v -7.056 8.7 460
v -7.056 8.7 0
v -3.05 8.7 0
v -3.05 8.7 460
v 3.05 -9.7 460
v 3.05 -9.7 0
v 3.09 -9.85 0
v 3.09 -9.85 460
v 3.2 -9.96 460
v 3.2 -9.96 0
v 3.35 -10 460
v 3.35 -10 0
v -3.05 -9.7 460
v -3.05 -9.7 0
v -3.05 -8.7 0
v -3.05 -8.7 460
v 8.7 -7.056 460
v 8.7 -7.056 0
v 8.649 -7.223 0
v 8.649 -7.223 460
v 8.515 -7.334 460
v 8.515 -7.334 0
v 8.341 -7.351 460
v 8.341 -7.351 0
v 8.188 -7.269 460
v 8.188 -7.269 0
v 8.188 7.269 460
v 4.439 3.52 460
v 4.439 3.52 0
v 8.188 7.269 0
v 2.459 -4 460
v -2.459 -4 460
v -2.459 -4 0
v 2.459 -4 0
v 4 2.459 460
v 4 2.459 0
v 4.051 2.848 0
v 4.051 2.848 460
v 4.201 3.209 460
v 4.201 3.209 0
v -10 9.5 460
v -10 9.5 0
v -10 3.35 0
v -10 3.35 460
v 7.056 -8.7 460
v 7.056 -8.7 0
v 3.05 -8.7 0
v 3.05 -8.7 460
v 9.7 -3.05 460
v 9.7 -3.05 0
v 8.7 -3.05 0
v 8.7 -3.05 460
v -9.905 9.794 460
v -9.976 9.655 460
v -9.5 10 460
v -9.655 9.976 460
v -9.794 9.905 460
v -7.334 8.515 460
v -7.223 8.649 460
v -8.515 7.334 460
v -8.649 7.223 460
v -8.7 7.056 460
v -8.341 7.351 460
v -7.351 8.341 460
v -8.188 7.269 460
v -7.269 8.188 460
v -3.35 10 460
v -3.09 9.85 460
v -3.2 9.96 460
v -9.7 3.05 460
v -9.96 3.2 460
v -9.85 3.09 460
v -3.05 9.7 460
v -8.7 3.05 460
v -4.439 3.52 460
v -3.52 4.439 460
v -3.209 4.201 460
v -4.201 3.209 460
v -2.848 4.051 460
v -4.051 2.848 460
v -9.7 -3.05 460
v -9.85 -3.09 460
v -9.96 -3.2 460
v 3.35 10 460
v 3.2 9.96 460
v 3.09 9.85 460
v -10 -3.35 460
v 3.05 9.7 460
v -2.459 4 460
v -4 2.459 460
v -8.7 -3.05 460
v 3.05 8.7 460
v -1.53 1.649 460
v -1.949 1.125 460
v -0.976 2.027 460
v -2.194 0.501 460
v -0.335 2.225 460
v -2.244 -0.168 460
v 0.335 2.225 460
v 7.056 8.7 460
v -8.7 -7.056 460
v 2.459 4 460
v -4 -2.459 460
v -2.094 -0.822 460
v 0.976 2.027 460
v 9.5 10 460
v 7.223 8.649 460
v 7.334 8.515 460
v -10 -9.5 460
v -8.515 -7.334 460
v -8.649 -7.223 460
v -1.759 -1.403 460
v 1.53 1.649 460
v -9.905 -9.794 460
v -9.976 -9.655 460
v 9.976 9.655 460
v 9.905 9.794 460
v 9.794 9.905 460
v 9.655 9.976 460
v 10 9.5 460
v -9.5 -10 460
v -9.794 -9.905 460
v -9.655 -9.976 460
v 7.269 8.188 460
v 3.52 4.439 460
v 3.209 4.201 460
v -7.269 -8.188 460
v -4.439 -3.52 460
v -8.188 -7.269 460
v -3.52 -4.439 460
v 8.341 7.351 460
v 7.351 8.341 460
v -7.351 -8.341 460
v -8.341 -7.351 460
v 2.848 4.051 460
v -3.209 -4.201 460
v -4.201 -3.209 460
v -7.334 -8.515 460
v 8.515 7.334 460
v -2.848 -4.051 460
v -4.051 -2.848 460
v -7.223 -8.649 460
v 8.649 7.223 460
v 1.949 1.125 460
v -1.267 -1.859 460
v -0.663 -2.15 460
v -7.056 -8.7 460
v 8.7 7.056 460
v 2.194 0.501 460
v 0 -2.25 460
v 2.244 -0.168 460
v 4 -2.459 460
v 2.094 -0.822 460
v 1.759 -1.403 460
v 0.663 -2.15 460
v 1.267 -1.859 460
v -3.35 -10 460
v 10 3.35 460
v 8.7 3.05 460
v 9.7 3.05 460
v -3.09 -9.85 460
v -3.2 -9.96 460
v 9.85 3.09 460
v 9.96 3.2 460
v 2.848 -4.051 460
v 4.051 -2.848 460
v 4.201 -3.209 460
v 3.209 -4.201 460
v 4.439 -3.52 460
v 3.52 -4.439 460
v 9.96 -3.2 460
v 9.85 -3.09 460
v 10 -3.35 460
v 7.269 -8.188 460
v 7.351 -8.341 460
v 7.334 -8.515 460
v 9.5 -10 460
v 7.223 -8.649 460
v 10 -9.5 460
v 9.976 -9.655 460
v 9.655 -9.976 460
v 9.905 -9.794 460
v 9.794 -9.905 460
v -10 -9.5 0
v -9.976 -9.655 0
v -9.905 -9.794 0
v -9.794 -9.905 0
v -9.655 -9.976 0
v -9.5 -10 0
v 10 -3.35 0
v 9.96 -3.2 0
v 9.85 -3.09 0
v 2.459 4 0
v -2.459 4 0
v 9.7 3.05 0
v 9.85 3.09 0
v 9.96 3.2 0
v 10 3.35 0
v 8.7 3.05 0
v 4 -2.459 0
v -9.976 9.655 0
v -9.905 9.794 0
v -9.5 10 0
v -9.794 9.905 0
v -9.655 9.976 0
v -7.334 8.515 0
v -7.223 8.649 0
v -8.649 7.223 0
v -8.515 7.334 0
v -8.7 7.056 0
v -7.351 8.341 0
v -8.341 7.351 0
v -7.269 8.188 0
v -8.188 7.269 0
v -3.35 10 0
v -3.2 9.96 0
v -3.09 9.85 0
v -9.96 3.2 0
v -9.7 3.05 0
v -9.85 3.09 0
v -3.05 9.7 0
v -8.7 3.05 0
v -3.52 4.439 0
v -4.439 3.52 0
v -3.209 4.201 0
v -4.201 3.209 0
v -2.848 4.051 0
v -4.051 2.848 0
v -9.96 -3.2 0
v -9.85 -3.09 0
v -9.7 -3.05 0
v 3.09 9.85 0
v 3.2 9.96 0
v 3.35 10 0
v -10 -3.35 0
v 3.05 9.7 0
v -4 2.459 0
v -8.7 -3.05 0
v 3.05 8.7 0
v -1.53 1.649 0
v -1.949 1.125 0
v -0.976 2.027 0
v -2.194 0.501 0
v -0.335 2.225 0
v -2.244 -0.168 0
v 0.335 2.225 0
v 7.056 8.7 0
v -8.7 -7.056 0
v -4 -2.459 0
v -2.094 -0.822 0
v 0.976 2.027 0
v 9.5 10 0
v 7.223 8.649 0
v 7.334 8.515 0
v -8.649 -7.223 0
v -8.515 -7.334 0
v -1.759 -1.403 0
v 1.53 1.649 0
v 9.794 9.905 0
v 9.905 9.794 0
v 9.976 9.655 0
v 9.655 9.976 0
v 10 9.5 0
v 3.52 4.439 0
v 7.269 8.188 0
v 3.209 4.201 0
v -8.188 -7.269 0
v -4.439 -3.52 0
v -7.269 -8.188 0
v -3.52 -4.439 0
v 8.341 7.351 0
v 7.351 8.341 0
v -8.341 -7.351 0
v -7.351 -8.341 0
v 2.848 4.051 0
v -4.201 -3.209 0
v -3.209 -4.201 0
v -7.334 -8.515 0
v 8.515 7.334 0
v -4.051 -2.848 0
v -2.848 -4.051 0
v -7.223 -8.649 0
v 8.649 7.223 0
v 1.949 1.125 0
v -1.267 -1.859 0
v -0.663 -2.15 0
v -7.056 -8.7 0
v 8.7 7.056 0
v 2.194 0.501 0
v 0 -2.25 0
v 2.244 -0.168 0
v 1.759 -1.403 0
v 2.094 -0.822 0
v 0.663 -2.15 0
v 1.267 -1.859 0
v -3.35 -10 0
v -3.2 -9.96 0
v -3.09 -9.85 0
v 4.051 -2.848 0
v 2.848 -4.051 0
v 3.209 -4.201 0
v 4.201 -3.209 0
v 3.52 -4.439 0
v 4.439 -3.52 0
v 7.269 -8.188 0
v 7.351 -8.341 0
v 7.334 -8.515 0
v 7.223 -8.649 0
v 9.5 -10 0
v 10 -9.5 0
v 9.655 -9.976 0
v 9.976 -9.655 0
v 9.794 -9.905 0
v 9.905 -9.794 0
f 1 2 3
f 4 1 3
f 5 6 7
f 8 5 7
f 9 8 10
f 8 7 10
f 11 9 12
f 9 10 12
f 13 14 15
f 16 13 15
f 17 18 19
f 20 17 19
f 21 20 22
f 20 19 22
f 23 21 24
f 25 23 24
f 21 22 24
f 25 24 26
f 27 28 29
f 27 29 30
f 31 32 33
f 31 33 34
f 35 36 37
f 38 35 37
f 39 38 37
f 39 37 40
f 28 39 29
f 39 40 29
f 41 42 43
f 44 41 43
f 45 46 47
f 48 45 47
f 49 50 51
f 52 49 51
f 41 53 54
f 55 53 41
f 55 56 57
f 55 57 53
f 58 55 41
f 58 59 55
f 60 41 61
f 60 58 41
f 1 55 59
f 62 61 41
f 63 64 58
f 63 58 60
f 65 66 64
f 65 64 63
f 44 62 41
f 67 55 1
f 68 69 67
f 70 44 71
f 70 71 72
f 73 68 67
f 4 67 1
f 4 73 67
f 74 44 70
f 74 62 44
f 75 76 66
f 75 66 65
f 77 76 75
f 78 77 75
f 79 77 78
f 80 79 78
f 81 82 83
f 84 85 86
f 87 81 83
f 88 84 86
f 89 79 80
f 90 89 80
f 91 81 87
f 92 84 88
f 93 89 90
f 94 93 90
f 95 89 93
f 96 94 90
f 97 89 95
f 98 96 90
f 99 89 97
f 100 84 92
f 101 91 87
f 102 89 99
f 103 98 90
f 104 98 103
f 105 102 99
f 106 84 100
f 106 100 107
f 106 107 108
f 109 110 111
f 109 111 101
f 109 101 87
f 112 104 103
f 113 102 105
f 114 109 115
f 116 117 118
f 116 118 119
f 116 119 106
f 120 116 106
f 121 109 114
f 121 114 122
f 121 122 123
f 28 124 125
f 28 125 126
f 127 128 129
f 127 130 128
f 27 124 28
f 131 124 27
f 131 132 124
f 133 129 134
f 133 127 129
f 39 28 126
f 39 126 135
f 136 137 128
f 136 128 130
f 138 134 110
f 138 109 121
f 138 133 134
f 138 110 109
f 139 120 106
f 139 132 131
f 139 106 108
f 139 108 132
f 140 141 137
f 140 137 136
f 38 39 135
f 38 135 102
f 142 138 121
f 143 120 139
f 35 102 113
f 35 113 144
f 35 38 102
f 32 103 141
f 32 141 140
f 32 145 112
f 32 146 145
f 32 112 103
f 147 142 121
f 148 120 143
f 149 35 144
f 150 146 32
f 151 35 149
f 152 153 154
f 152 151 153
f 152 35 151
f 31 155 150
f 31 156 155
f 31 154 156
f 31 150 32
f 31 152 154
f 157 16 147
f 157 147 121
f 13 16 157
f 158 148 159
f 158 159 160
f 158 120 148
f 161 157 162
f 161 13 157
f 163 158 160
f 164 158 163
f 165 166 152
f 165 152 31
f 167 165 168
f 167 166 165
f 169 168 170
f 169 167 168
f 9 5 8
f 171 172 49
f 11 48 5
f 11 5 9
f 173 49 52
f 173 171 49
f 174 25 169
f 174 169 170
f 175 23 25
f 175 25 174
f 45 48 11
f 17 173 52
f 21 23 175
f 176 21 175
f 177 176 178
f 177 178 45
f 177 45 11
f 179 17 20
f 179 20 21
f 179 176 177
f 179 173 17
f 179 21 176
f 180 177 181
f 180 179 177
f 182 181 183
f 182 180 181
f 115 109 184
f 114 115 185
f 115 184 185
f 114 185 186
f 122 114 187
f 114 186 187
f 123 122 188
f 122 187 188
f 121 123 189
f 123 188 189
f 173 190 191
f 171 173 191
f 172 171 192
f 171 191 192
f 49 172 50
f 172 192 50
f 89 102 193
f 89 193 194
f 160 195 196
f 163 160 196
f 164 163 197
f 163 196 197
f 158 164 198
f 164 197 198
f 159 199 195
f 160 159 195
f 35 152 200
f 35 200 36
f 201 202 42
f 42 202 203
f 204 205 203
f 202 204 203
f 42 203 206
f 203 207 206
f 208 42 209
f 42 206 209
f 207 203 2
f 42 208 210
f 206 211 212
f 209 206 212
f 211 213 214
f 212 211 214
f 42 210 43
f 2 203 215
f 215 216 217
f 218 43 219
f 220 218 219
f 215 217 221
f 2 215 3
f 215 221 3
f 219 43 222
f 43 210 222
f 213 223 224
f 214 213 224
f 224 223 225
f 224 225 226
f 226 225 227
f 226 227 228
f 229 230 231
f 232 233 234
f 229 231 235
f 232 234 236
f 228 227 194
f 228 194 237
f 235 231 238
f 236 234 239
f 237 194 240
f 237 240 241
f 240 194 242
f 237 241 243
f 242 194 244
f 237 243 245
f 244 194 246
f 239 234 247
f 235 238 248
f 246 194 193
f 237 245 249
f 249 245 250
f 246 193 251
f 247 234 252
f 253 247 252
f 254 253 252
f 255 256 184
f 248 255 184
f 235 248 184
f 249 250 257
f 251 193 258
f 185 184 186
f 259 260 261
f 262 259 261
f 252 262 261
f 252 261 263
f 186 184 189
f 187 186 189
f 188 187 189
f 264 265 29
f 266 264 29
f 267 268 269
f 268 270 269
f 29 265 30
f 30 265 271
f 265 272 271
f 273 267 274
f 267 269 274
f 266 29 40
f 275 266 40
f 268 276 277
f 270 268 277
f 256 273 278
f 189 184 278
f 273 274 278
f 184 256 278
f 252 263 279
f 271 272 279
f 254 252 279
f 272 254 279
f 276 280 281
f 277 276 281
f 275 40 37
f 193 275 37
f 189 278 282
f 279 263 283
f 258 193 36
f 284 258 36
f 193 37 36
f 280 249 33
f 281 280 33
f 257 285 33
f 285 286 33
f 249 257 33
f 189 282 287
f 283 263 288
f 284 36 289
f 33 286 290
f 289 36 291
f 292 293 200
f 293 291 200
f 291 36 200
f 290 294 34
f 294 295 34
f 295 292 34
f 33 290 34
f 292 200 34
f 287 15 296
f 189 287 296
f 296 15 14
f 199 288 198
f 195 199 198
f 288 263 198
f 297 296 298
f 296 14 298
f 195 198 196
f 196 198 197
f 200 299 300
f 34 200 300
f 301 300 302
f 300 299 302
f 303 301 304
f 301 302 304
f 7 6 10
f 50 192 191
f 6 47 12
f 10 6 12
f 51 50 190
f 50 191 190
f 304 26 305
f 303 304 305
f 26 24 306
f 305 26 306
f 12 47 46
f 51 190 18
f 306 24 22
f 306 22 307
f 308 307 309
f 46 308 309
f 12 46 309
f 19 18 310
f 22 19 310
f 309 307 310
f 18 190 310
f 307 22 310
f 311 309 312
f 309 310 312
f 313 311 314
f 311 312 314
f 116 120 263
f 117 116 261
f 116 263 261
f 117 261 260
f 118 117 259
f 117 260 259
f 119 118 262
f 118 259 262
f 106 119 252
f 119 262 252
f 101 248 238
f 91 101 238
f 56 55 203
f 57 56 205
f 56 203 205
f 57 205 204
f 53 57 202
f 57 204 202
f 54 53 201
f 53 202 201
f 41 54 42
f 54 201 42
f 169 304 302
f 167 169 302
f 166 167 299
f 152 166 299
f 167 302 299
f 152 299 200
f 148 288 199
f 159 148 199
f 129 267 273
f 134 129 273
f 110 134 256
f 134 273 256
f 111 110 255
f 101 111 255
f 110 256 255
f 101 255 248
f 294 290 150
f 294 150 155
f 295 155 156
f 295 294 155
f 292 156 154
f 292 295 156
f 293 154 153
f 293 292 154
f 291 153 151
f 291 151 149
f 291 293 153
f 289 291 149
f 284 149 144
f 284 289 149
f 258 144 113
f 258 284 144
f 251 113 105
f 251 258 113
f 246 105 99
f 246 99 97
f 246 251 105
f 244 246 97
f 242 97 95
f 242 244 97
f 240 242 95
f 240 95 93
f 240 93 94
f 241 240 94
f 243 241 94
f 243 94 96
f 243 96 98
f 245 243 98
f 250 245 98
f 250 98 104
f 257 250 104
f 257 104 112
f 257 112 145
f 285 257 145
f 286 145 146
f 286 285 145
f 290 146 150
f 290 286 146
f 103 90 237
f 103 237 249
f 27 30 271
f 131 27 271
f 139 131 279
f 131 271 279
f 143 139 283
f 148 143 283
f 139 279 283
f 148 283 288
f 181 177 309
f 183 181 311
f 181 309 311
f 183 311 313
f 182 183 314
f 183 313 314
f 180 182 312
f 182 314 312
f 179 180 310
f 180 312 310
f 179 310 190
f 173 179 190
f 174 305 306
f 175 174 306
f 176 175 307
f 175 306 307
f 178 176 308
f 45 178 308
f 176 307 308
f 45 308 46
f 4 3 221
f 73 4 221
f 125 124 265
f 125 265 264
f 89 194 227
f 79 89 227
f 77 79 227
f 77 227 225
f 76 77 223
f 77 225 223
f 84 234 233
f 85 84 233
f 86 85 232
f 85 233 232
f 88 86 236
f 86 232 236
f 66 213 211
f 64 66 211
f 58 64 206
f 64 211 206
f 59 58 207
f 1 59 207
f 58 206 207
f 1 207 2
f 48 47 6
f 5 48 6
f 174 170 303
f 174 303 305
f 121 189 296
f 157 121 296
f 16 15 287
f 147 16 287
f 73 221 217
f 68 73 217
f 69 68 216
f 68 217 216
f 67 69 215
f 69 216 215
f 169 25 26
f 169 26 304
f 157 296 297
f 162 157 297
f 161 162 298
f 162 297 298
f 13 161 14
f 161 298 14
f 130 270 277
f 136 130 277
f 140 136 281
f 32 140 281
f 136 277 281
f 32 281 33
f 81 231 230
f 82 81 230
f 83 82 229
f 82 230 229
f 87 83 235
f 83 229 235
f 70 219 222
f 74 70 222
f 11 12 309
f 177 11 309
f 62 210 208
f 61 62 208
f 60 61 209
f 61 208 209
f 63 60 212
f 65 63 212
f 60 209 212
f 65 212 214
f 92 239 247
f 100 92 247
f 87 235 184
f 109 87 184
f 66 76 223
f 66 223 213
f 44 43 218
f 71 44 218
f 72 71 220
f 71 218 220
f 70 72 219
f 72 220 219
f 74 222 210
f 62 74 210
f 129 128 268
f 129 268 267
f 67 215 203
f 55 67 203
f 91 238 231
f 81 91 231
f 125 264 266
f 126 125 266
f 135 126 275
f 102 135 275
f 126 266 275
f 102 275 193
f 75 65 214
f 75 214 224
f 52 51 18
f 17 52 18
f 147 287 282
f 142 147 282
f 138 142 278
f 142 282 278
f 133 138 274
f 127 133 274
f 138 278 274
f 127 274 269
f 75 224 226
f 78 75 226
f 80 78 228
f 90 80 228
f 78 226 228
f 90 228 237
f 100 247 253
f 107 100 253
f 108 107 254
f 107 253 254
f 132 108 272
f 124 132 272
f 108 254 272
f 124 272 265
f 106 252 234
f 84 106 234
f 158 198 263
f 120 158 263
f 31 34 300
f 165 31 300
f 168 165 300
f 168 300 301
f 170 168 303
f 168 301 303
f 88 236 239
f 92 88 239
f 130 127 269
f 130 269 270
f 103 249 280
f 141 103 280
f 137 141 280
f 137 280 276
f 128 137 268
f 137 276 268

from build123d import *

# Parameters (mm, degrees)
ESBO_O11_R                                   = 2.25
QUADRADO_PF20_21_PERFIL_2020_T_SLOT_6M_DEPTH = 460


with BuildPart() as part:
    # Esboço11 → Quadrado PF20-21 - PERFIL 2020 T-SLOT 6MM(1) (new body)
    with BuildSketch(Plane(origin=(0, 0, 0), x_dir=(0, -1, 0), z_dir=(0, 0, 1))):
        with BuildLine():
            Line((8.187867966, -7.26862915), (4.439339828, -3.520101013))
            ThreePointArc((4.439339828, -3.520101013), (4.114180701, -3.033465989), (4, -2.459440841))
            Line((4, -2.459440841), (4, 2.459440841))
            ThreePointArc((4, 2.459440841), (4.114180701, 3.033465989), (4.439339828, 3.520101013))
            Line((4.439339828, 3.520101013), (8.187867966, 7.26862915))
            ThreePointArc((8.187867966, 7.26862915), (8.51480503, 7.333660975), (8.7, 7.056497116))
            Line((8.7, 7.056497116), (8.7, 3.05))
            Line((8.7, 3.05), (9.7, 3.05))
            ThreePointArc((9.7, 3.05), (9.912132034, 3.137867966), (10, 3.35))
            Line((10, 3.35), (10, 9.5))
            ThreePointArc((10, 9.5), (9.853553391, 9.853553391), (9.5, 10))
            Line((9.5, 10), (3.35, 10))
            ThreePointArc((3.35, 10), (3.137867966, 9.912132034), (3.05, 9.7))
            Line((3.05, 9.7), (3.05, 8.7))
            Line((3.05, 8.7), (7.056497116, 8.7))
            ThreePointArc((7.056497116, 8.7), (7.333660975, 8.51480503), (7.26862915, 8.187867966))
            Line((7.26862915, 8.187867966), (3.520101013, 4.439339828))
            ThreePointArc((3.520101013, 4.439339828), (3.033465989, 4.114180701), (2.459440841, 4))
            Line((2.459440841, 4), (-2.459440841, 4))
            ThreePointArc((-2.459440841, 4), (-3.033465989, 4.114180701), (-3.520101013, 4.439339828))
            Line((-3.520101013, 4.439339828), (-7.26862915, 8.187867966))
            ThreePointArc((-7.26862915, 8.187867966), (-7.333660975, 8.51480503), (-7.056497116, 8.7))
            Line((-7.056497116, 8.7), (-3.05, 8.7))
            Line((-3.05, 8.7), (-3.05, 9.7))
            ThreePointArc((-3.05, 9.7), (-3.137867966, 9.912132034), (-3.35, 10))
            Line((-3.35, 10), (-9.5, 10))
            ThreePointArc((-9.5, 10), (-9.853553391, 9.853553391), (-10, 9.5))
            Line((-10, 9.5), (-10, 3.35))
            ThreePointArc((-10, 3.35), (-9.912132034, 3.137867966), (-9.7, 3.05))
            Line((-9.7, 3.05), (-8.7, 3.05))
            Line((-8.7, 3.05), (-8.7, 7.056497116))
            ThreePointArc((-8.7, 7.056497116), (-8.51480503, 7.333660975), (-8.187867966, 7.26862915))
            Line((-8.187867966, 7.26862915), (-4.439339828, 3.520101013))
            ThreePointArc((-4.439339828, 3.520101013), (-4.114180701, 3.033465989), (-4, 2.459440841))
            Line((-4, 2.459440841), (-4, -2.459440841))
            ThreePointArc((-4, -2.459440841), (-4.114180701, -3.033465989), (-4.439339828, -3.520101013))
            Line((-4.439339828, -3.520101013), (-8.187867966, -7.26862915))
            ThreePointArc((-8.187867966, -7.26862915), (-8.51480503, -7.333660975), (-8.7, -7.056497116))
            Line((-8.7, -7.056497116), (-8.7, -3.05))
            Line((-8.7, -3.05), (-9.7, -3.05))
            ThreePointArc((-9.7, -3.05), (-9.912132034, -3.137867966), (-10, -3.35))
            Line((-10, -3.35), (-10, -9.5))
            ThreePointArc((-10, -9.5), (-9.853553391, -9.853553391), (-9.5, -10))
            Line((-9.5, -10), (-3.35, -10))
            ThreePointArc((-3.35, -10), (-3.137867966, -9.912132034), (-3.05, -9.7))
            Line((-3.05, -9.7), (-3.05, -8.7))
            Line((-3.05, -8.7), (-7.056497116, -8.7))
            ThreePointArc((-7.056497116, -8.7), (-7.333660975, -8.51480503), (-7.26862915, -8.187867966))
            Line((-7.26862915, -8.187867966), (-3.520101013, -4.439339828))
            ThreePointArc((-3.520101013, -4.439339828), (-3.033465989, -4.114180701), (-2.459440841, -4))
            Line((-2.459440841, -4), (2.459440841, -4))
            ThreePointArc((2.459440841, -4), (3.033465989, -4.114180701), (3.520101013, -4.439339828))
            Line((3.520101013, -4.439339828), (7.26862915, -8.187867966))
            ThreePointArc((7.26862915, -8.187867966), (7.333660975, -8.51480503), (7.056497116, -8.7))
            Line((7.056497116, -8.7), (3.05, -8.7))
            Line((3.05, -8.7), (3.05, -9.7))
            ThreePointArc((3.05, -9.7), (3.137867966, -9.912132034), (3.35, -10))
            Line((3.35, -10), (9.5, -10))
            ThreePointArc((9.5, -10), (9.853553391, -9.853553391), (10, -9.5))
            Line((10, -9.5), (10, -3.35))
            ThreePointArc((10, -3.35), (9.912132034, -3.137867966), (9.7, -3.05))
            Line((9.7, -3.05), (8.7, -3.05))
            Line((8.7, -3.05), (8.7, -7.056497116))
            ThreePointArc((8.7, -7.056497116), (8.51480503, -7.333660975), (8.187867966, -7.26862915))
        make_face()
        Circle(ESBO_O11_R, mode=Mode.SUBTRACT)
    extrude(amount=QUADRADO_PF20_21_PERFIL_2020_T_SLOT_6M_DEPTH)


solid = part.part
